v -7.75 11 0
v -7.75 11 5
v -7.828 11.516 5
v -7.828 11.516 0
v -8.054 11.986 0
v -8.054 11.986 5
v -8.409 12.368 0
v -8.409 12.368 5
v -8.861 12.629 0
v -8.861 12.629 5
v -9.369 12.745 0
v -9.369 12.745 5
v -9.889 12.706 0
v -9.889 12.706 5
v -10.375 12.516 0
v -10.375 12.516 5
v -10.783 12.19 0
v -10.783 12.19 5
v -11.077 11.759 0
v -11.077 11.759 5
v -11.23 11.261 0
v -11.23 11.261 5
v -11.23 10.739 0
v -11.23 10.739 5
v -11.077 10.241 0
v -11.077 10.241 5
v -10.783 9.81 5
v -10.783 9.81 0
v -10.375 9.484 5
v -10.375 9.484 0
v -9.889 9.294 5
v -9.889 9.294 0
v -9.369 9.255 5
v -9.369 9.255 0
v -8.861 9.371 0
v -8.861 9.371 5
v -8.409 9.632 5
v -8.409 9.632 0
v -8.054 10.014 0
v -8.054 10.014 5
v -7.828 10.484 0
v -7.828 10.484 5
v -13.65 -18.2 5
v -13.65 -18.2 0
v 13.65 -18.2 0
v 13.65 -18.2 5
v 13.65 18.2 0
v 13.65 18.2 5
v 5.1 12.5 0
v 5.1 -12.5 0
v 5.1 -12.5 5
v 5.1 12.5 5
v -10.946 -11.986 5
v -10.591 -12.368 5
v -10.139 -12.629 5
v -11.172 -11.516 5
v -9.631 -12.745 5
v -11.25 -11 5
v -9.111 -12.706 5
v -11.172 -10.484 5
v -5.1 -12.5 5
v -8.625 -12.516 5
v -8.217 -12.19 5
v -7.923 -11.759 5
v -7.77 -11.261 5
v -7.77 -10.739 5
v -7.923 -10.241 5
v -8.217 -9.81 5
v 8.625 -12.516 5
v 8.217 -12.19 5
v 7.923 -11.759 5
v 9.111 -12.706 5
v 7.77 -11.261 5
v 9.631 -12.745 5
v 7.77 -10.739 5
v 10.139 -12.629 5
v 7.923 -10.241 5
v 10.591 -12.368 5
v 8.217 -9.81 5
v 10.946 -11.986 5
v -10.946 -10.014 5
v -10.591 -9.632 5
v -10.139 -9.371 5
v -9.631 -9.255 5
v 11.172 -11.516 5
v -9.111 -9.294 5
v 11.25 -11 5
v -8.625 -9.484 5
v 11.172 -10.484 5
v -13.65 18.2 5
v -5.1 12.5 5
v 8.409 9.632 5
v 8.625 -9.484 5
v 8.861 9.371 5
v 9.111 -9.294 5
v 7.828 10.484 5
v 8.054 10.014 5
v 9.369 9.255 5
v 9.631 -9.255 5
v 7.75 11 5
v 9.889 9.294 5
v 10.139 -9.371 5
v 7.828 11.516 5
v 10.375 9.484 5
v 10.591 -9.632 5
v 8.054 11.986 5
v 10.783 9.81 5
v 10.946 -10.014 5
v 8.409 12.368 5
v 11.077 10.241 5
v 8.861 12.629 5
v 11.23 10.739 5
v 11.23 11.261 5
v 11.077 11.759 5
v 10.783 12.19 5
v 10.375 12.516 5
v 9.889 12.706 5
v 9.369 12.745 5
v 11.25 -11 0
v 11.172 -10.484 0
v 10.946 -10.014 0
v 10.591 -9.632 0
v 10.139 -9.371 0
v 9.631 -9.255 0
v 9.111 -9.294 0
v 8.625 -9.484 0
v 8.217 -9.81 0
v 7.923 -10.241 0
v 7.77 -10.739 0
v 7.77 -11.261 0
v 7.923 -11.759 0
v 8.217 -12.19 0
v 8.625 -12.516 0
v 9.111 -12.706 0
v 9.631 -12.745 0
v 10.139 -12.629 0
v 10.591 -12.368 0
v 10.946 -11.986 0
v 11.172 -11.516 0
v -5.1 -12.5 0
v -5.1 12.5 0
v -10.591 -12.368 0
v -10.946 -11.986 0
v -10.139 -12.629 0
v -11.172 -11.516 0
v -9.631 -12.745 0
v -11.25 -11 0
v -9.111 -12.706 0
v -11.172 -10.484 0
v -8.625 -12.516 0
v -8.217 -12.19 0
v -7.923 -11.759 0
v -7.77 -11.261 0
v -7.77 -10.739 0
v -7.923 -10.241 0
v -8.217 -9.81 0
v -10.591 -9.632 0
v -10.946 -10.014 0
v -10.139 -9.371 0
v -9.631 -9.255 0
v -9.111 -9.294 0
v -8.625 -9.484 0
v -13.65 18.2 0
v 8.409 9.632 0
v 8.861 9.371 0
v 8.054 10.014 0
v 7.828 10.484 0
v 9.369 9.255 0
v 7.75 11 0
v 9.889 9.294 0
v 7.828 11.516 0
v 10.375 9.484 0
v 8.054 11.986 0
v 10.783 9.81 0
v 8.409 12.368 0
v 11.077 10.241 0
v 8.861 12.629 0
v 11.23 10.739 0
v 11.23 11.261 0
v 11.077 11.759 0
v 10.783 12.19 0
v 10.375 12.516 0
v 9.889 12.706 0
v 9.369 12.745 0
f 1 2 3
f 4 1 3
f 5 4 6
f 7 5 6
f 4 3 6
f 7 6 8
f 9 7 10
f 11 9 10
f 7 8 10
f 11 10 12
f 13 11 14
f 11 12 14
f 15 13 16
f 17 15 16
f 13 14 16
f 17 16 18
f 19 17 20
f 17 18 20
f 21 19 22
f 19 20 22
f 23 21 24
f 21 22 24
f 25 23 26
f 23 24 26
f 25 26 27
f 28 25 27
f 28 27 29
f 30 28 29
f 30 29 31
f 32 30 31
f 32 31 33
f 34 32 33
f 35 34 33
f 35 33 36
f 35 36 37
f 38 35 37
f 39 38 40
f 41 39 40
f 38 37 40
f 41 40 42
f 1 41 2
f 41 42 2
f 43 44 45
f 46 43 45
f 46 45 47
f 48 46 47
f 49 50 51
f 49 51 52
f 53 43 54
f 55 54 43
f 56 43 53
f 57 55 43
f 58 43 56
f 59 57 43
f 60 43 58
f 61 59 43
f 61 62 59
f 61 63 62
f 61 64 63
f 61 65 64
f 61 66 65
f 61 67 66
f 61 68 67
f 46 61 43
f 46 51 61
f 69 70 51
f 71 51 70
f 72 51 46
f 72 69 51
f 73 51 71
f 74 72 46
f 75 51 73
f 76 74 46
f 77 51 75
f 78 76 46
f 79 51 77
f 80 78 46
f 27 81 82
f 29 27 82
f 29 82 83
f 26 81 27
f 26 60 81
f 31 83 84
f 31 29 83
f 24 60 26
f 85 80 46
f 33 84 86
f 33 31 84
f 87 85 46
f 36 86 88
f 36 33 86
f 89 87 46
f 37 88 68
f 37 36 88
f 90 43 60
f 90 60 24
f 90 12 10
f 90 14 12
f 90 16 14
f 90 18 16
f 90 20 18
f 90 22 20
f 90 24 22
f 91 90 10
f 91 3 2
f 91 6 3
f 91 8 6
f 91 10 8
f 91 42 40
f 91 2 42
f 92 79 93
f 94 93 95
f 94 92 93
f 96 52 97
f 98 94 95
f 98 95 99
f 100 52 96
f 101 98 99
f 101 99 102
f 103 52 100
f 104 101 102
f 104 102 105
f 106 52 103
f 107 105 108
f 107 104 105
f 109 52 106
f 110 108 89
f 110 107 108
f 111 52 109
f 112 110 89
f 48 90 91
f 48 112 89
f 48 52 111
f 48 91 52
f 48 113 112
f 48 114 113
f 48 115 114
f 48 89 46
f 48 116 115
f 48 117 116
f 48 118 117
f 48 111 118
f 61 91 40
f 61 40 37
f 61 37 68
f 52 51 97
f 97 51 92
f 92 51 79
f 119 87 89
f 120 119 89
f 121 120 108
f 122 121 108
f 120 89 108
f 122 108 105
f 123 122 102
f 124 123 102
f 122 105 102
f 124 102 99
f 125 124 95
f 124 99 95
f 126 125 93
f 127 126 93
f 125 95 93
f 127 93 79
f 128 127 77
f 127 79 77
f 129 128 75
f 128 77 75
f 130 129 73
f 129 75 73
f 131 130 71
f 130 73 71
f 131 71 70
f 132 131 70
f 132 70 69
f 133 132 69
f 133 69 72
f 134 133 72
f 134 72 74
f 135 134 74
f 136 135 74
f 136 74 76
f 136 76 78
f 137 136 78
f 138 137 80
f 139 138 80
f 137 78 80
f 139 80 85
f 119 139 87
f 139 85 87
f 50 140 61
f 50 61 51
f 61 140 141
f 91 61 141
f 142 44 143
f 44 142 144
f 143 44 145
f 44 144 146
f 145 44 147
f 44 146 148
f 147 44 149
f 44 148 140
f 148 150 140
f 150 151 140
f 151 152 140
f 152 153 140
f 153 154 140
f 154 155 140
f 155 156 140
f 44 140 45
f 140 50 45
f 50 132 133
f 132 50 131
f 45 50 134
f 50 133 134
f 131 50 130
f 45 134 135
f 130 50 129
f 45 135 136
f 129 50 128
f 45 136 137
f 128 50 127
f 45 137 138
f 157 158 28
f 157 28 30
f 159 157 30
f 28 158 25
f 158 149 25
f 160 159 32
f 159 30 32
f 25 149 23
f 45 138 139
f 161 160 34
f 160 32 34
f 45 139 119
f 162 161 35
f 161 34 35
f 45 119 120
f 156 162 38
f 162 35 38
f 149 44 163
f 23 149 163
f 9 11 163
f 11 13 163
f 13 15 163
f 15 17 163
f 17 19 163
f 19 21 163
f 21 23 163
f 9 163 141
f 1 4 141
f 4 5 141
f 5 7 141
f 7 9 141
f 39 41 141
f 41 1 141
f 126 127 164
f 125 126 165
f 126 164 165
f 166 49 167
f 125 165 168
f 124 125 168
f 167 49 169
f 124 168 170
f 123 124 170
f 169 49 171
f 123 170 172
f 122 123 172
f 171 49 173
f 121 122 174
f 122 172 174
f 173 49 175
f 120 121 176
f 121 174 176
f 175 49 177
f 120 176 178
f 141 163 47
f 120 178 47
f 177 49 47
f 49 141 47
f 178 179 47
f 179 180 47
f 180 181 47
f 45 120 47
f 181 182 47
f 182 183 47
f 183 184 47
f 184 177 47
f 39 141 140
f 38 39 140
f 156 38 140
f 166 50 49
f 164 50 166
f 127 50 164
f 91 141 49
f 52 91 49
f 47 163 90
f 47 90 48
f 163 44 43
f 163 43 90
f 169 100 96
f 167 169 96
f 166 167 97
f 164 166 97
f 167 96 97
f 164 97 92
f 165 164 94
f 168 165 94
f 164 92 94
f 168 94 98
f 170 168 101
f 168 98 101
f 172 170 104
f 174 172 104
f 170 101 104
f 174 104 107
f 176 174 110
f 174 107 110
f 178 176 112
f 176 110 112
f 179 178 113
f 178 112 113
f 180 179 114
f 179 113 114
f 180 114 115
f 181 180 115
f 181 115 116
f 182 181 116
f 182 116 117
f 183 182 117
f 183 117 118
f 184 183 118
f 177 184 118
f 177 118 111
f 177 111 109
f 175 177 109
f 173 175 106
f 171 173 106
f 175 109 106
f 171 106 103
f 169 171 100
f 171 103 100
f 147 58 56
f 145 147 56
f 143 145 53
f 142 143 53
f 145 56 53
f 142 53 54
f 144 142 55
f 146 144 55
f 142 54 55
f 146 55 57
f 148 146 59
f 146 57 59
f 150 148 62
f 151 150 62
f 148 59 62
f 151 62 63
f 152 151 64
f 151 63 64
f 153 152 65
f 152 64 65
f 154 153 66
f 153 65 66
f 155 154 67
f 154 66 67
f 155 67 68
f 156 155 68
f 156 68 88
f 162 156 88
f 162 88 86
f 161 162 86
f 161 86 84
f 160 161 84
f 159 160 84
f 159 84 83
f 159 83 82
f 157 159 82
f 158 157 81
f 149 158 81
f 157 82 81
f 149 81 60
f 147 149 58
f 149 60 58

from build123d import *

# Parameters (mm, degrees)
SKETCH1_W           = 27.3
SKETCH1_H           = 36.4
SKETCH1_W_2         = 10.2
SKETCH1_H_2         = 25
BOSS_EXTRUDE1_DEPTH = 5
SKETCH2_R           = 1.75
CUT_EXTRUDE1_DEPTH  = 5


with BuildPart() as part:
    # Sketch1 → Boss-Extrude1 (new body)
    with BuildSketch(Plane.XY):
        Rectangle(SKETCH1_W, SKETCH1_H)
        Rectangle(SKETCH1_W_2, SKETCH1_H_2, mode=Mode.SUBTRACT)
    extrude(amount=BOSS_EXTRUDE1_DEPTH)

    # Sketch2 → Cut-Extrude1 (cut)
    with BuildSketch(Plane.XY.offset(5)):
        with Locations((-9.5, 11)):
            Circle(SKETCH2_R)
        with Locations(Location((9.5, 11, 0), (0, 0, 180))):
            Circle(SKETCH2_R)
        with Locations(Location((-9.5, -11, 0), (0, 0, 180))):
            Circle(SKETCH2_R)
        with Locations((9.5, -11)):
            Circle(SKETCH2_R)
    extrude(amount=-CUT_EXTRUDE1_DEPTH, mode=Mode.SUBTRACT)


solid = part.part
